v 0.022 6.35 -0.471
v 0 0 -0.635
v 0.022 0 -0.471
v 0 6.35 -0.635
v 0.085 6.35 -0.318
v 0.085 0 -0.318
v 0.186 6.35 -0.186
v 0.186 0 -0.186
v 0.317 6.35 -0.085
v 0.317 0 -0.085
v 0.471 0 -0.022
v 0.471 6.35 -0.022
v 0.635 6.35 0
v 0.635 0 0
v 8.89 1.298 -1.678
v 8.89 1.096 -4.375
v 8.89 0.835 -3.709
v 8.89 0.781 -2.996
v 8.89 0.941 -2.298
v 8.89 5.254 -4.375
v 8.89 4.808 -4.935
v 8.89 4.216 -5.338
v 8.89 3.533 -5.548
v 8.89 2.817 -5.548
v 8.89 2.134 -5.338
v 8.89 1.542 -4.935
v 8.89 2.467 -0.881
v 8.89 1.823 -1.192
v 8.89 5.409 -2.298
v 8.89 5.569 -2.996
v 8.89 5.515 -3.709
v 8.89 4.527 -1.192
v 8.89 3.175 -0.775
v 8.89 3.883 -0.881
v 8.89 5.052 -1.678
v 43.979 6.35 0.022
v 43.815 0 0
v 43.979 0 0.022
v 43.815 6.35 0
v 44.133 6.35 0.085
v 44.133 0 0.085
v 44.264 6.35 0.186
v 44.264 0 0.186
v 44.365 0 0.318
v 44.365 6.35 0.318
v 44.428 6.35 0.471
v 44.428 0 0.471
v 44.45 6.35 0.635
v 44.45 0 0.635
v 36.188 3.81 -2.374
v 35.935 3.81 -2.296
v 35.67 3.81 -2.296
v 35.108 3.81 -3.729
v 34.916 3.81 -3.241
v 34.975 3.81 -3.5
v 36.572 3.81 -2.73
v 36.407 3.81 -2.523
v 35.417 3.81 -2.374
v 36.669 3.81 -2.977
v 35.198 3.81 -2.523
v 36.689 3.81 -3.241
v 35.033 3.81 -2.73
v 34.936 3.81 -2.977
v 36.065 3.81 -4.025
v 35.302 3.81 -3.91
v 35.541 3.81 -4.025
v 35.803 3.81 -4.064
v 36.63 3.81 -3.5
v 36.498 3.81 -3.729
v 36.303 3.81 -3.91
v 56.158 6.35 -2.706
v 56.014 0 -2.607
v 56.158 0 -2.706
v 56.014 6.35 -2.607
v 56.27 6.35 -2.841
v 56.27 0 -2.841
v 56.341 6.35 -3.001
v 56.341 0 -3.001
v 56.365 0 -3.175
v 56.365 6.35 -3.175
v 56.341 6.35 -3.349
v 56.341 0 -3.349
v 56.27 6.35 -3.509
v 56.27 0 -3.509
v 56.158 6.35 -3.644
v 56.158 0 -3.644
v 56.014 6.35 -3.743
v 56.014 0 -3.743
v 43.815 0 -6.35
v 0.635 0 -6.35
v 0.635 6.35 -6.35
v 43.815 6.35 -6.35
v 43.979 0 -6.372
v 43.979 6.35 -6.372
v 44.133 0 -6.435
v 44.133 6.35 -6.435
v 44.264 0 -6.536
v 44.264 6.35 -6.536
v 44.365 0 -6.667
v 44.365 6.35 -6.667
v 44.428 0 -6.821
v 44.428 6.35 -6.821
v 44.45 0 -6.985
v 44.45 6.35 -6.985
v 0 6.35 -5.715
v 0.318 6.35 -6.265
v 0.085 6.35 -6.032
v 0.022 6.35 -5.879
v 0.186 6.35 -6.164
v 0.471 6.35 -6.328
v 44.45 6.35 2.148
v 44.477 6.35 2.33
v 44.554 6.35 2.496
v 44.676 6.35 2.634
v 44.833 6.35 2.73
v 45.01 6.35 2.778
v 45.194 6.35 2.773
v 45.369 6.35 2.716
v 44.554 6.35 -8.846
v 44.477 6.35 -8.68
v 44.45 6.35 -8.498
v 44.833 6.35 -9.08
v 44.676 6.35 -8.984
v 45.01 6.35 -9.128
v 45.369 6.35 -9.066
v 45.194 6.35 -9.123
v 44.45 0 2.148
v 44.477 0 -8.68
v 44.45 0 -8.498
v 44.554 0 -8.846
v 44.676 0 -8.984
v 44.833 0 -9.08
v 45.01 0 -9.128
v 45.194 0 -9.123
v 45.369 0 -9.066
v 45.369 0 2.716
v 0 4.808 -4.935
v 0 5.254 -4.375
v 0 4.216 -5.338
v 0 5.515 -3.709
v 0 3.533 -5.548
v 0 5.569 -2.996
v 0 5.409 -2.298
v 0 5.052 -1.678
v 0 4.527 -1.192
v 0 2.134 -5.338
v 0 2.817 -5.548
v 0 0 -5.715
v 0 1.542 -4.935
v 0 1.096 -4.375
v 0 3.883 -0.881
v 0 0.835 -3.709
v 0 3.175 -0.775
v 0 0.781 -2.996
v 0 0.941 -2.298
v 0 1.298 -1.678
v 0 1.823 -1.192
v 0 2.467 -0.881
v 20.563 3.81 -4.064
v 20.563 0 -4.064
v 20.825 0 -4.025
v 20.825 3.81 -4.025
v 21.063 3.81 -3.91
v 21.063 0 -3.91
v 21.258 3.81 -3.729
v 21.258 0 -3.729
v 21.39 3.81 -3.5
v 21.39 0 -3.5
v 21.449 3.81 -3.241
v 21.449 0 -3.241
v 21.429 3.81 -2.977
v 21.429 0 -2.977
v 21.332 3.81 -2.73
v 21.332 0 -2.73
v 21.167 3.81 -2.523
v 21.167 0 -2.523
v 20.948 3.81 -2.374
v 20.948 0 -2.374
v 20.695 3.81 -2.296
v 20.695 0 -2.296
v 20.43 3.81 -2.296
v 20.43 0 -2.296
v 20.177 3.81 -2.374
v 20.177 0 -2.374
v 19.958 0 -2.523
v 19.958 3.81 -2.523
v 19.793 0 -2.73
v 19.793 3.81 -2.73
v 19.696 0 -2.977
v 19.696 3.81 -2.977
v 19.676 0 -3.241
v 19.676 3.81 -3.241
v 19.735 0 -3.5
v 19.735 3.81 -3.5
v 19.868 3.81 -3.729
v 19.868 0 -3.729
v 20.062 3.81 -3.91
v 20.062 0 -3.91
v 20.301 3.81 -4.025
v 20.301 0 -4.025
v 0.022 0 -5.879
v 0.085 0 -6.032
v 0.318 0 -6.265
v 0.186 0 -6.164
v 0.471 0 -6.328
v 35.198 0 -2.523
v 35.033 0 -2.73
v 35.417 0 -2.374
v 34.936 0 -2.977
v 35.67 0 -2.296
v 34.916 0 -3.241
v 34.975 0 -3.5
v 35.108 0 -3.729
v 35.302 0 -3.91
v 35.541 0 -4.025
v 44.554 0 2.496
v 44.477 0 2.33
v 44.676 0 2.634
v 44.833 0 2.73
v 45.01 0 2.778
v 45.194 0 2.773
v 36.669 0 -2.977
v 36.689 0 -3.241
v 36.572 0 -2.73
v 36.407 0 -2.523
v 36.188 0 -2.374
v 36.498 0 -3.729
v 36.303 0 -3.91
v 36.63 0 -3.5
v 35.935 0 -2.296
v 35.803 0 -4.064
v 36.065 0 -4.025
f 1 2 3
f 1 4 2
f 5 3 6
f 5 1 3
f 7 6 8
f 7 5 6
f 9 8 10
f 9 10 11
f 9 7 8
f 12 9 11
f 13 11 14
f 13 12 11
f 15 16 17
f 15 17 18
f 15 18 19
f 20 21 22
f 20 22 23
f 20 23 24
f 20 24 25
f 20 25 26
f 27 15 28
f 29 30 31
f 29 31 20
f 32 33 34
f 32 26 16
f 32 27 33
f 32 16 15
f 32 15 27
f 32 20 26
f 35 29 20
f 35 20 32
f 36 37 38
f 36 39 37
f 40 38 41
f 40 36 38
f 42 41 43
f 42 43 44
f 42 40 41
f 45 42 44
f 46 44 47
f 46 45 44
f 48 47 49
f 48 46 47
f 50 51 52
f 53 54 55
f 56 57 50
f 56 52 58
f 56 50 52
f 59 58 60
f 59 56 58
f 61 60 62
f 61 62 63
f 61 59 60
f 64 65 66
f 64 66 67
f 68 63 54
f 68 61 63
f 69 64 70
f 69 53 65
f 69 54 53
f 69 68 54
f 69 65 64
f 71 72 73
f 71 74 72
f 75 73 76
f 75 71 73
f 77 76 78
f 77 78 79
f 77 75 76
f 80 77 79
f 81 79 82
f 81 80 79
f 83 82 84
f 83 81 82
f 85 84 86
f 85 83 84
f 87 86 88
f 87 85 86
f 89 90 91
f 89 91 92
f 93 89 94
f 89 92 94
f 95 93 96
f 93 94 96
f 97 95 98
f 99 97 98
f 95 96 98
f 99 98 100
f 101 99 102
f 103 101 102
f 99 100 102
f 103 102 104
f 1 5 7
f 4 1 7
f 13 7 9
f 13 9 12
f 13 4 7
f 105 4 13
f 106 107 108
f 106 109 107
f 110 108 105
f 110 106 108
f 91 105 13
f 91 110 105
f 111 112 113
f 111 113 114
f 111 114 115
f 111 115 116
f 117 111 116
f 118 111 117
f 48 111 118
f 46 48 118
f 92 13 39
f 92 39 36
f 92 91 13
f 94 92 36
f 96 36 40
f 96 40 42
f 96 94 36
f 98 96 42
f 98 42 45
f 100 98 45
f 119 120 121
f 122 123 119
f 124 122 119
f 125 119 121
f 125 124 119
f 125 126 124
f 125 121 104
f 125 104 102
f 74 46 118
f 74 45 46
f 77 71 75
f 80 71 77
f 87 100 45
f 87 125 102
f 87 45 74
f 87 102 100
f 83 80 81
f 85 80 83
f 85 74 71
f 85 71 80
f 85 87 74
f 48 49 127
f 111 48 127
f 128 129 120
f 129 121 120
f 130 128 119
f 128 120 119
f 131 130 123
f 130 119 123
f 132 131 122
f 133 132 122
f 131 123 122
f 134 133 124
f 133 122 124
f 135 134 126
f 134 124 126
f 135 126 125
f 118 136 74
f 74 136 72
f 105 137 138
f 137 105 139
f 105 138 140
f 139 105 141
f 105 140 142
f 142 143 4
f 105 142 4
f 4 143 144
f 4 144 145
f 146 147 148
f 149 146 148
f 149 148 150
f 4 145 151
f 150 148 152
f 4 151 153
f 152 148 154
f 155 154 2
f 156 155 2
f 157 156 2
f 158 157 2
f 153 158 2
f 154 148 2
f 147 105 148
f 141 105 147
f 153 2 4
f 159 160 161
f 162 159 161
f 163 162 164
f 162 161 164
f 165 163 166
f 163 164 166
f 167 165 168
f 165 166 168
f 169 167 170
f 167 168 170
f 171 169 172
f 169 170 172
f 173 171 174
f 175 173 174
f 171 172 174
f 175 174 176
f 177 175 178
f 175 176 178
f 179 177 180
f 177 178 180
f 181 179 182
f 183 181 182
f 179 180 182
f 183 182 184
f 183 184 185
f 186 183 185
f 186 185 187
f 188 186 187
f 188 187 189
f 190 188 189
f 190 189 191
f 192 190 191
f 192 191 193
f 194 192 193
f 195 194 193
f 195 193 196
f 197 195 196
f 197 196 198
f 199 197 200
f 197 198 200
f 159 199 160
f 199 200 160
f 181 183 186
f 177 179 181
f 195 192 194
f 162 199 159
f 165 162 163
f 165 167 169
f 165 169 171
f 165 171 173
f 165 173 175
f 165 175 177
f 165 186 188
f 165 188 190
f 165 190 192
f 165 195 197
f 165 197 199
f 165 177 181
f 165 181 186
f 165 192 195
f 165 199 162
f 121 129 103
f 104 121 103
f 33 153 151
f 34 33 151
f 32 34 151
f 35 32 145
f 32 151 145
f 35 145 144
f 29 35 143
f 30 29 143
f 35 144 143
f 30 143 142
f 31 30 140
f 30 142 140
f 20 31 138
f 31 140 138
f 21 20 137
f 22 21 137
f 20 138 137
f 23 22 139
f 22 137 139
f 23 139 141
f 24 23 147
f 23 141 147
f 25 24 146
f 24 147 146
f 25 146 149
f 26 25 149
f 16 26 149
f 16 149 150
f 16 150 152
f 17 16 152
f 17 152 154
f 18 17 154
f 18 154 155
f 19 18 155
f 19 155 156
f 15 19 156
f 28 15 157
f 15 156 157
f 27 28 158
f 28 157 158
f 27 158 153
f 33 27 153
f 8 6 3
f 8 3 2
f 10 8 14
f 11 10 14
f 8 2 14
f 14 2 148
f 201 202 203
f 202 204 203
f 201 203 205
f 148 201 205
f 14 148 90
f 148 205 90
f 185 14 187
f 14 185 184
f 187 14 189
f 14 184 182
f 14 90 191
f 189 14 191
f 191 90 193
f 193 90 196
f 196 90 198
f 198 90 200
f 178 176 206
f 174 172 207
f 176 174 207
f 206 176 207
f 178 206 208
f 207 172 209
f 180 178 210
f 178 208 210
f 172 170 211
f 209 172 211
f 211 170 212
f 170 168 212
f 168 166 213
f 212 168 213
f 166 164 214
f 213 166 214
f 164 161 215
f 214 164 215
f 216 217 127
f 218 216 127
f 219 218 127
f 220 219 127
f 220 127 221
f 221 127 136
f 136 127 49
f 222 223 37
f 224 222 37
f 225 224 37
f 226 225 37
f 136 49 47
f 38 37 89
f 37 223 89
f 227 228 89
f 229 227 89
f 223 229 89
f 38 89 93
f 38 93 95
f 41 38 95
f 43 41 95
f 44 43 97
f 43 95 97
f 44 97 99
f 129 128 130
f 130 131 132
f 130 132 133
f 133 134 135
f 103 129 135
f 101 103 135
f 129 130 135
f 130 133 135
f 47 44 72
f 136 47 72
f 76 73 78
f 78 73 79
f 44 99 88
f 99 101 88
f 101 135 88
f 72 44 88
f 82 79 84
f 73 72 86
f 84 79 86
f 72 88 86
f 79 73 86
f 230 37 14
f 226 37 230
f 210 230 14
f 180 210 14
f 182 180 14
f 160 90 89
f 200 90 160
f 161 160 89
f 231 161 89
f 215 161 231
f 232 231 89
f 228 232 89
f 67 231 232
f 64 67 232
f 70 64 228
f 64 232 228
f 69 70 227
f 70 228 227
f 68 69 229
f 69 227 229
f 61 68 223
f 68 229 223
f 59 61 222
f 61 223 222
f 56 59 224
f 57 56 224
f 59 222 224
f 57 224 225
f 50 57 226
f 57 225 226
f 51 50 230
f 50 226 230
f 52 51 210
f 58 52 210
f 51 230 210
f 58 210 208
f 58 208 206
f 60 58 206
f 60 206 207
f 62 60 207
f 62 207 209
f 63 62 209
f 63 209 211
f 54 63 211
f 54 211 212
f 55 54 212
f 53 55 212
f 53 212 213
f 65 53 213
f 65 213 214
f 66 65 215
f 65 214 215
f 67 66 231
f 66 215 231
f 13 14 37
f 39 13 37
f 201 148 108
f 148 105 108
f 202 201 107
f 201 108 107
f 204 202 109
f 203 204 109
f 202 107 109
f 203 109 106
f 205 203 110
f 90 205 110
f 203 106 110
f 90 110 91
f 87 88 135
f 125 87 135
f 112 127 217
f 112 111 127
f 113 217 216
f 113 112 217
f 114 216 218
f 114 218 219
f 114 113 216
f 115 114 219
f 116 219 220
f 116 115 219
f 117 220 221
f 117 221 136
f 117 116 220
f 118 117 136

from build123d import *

# Parameters (mm, degrees)
SKETCH1_W           = 44.45
SKETCH1_H           = 3.175
BOSS_EXTRUDE1_DEPTH = 6.35
SKETCH2_R           = 2.4003
CUT_EXTRUDE1_DEPTH  = 8.89
FILLET1_R           = 0.635
SKETCH4_R           = 0.889
CUT_EXTRUDE2_DEPTH  = 3.81


with BuildPart() as part:
    # Sketch1 → Boss-Extrude1 (new body)
    with BuildSketch(Plane(origin=(0, 0, 0), x_dir=(1, 0, 0), z_dir=(0, 1, 0))):
        with Locations((22.225, 4.7625)):
            Rectangle(SKETCH1_W, SKETCH1_H)
        with Locations((22.225, 1.5875)):
            Rectangle(SKETCH1_W, SKETCH1_H)
        Polygon((44.45, 6.35), (44.45, 3.175), (57.15, 3.175), (44.45, 9.525), align=None)
        Polygon((57.15, 3.175), (44.45, 3.175), (44.45, 0), (44.45, -3.175), align=None)
    extrude(amount=BOSS_EXTRUDE1_DEPTH)

    # Sketch2 → Cut-Extrude1 (cut)
    with BuildSketch(Plane.ZY):
        with Locations((-3.175, 3.175)):
            Circle(SKETCH2_R)
    extrude(amount=-CUT_EXTRUDE1_DEPTH, mode=Mode.SUBTRACT)

    # Fillet1
    fillet1_edges = [part.edges().sort_by_distance(p)[0] for p in [
        (0, 3.175, -6.35),
        (44.45, 3.175, -6.35),
        (44.45, 3.175, -9.525),
        (57.15, 3.175, -3.175),
        (44.45, 3.175, 3.175),
        (44.45, 3.175, 0),
        (0, 3.175, 0),
    ]]
    fillet(fillet1_edges, radius=FILLET1_R)

    # Sketch4 → Cut-Extrude2 (cut)
    with BuildSketch(Plane.XZ):
        with Locations(Location((20.562548417, -3.175, 0), (0, 0, 270))):
            Circle(SKETCH4_R)
        with Locations(Location((35.802548417, -3.175, 0), (0, 0, 270))):
            Circle(SKETCH4_R)
    extrude(amount=-CUT_EXTRUDE2_DEPTH, mode=Mode.SUBTRACT)


solid = part.part
